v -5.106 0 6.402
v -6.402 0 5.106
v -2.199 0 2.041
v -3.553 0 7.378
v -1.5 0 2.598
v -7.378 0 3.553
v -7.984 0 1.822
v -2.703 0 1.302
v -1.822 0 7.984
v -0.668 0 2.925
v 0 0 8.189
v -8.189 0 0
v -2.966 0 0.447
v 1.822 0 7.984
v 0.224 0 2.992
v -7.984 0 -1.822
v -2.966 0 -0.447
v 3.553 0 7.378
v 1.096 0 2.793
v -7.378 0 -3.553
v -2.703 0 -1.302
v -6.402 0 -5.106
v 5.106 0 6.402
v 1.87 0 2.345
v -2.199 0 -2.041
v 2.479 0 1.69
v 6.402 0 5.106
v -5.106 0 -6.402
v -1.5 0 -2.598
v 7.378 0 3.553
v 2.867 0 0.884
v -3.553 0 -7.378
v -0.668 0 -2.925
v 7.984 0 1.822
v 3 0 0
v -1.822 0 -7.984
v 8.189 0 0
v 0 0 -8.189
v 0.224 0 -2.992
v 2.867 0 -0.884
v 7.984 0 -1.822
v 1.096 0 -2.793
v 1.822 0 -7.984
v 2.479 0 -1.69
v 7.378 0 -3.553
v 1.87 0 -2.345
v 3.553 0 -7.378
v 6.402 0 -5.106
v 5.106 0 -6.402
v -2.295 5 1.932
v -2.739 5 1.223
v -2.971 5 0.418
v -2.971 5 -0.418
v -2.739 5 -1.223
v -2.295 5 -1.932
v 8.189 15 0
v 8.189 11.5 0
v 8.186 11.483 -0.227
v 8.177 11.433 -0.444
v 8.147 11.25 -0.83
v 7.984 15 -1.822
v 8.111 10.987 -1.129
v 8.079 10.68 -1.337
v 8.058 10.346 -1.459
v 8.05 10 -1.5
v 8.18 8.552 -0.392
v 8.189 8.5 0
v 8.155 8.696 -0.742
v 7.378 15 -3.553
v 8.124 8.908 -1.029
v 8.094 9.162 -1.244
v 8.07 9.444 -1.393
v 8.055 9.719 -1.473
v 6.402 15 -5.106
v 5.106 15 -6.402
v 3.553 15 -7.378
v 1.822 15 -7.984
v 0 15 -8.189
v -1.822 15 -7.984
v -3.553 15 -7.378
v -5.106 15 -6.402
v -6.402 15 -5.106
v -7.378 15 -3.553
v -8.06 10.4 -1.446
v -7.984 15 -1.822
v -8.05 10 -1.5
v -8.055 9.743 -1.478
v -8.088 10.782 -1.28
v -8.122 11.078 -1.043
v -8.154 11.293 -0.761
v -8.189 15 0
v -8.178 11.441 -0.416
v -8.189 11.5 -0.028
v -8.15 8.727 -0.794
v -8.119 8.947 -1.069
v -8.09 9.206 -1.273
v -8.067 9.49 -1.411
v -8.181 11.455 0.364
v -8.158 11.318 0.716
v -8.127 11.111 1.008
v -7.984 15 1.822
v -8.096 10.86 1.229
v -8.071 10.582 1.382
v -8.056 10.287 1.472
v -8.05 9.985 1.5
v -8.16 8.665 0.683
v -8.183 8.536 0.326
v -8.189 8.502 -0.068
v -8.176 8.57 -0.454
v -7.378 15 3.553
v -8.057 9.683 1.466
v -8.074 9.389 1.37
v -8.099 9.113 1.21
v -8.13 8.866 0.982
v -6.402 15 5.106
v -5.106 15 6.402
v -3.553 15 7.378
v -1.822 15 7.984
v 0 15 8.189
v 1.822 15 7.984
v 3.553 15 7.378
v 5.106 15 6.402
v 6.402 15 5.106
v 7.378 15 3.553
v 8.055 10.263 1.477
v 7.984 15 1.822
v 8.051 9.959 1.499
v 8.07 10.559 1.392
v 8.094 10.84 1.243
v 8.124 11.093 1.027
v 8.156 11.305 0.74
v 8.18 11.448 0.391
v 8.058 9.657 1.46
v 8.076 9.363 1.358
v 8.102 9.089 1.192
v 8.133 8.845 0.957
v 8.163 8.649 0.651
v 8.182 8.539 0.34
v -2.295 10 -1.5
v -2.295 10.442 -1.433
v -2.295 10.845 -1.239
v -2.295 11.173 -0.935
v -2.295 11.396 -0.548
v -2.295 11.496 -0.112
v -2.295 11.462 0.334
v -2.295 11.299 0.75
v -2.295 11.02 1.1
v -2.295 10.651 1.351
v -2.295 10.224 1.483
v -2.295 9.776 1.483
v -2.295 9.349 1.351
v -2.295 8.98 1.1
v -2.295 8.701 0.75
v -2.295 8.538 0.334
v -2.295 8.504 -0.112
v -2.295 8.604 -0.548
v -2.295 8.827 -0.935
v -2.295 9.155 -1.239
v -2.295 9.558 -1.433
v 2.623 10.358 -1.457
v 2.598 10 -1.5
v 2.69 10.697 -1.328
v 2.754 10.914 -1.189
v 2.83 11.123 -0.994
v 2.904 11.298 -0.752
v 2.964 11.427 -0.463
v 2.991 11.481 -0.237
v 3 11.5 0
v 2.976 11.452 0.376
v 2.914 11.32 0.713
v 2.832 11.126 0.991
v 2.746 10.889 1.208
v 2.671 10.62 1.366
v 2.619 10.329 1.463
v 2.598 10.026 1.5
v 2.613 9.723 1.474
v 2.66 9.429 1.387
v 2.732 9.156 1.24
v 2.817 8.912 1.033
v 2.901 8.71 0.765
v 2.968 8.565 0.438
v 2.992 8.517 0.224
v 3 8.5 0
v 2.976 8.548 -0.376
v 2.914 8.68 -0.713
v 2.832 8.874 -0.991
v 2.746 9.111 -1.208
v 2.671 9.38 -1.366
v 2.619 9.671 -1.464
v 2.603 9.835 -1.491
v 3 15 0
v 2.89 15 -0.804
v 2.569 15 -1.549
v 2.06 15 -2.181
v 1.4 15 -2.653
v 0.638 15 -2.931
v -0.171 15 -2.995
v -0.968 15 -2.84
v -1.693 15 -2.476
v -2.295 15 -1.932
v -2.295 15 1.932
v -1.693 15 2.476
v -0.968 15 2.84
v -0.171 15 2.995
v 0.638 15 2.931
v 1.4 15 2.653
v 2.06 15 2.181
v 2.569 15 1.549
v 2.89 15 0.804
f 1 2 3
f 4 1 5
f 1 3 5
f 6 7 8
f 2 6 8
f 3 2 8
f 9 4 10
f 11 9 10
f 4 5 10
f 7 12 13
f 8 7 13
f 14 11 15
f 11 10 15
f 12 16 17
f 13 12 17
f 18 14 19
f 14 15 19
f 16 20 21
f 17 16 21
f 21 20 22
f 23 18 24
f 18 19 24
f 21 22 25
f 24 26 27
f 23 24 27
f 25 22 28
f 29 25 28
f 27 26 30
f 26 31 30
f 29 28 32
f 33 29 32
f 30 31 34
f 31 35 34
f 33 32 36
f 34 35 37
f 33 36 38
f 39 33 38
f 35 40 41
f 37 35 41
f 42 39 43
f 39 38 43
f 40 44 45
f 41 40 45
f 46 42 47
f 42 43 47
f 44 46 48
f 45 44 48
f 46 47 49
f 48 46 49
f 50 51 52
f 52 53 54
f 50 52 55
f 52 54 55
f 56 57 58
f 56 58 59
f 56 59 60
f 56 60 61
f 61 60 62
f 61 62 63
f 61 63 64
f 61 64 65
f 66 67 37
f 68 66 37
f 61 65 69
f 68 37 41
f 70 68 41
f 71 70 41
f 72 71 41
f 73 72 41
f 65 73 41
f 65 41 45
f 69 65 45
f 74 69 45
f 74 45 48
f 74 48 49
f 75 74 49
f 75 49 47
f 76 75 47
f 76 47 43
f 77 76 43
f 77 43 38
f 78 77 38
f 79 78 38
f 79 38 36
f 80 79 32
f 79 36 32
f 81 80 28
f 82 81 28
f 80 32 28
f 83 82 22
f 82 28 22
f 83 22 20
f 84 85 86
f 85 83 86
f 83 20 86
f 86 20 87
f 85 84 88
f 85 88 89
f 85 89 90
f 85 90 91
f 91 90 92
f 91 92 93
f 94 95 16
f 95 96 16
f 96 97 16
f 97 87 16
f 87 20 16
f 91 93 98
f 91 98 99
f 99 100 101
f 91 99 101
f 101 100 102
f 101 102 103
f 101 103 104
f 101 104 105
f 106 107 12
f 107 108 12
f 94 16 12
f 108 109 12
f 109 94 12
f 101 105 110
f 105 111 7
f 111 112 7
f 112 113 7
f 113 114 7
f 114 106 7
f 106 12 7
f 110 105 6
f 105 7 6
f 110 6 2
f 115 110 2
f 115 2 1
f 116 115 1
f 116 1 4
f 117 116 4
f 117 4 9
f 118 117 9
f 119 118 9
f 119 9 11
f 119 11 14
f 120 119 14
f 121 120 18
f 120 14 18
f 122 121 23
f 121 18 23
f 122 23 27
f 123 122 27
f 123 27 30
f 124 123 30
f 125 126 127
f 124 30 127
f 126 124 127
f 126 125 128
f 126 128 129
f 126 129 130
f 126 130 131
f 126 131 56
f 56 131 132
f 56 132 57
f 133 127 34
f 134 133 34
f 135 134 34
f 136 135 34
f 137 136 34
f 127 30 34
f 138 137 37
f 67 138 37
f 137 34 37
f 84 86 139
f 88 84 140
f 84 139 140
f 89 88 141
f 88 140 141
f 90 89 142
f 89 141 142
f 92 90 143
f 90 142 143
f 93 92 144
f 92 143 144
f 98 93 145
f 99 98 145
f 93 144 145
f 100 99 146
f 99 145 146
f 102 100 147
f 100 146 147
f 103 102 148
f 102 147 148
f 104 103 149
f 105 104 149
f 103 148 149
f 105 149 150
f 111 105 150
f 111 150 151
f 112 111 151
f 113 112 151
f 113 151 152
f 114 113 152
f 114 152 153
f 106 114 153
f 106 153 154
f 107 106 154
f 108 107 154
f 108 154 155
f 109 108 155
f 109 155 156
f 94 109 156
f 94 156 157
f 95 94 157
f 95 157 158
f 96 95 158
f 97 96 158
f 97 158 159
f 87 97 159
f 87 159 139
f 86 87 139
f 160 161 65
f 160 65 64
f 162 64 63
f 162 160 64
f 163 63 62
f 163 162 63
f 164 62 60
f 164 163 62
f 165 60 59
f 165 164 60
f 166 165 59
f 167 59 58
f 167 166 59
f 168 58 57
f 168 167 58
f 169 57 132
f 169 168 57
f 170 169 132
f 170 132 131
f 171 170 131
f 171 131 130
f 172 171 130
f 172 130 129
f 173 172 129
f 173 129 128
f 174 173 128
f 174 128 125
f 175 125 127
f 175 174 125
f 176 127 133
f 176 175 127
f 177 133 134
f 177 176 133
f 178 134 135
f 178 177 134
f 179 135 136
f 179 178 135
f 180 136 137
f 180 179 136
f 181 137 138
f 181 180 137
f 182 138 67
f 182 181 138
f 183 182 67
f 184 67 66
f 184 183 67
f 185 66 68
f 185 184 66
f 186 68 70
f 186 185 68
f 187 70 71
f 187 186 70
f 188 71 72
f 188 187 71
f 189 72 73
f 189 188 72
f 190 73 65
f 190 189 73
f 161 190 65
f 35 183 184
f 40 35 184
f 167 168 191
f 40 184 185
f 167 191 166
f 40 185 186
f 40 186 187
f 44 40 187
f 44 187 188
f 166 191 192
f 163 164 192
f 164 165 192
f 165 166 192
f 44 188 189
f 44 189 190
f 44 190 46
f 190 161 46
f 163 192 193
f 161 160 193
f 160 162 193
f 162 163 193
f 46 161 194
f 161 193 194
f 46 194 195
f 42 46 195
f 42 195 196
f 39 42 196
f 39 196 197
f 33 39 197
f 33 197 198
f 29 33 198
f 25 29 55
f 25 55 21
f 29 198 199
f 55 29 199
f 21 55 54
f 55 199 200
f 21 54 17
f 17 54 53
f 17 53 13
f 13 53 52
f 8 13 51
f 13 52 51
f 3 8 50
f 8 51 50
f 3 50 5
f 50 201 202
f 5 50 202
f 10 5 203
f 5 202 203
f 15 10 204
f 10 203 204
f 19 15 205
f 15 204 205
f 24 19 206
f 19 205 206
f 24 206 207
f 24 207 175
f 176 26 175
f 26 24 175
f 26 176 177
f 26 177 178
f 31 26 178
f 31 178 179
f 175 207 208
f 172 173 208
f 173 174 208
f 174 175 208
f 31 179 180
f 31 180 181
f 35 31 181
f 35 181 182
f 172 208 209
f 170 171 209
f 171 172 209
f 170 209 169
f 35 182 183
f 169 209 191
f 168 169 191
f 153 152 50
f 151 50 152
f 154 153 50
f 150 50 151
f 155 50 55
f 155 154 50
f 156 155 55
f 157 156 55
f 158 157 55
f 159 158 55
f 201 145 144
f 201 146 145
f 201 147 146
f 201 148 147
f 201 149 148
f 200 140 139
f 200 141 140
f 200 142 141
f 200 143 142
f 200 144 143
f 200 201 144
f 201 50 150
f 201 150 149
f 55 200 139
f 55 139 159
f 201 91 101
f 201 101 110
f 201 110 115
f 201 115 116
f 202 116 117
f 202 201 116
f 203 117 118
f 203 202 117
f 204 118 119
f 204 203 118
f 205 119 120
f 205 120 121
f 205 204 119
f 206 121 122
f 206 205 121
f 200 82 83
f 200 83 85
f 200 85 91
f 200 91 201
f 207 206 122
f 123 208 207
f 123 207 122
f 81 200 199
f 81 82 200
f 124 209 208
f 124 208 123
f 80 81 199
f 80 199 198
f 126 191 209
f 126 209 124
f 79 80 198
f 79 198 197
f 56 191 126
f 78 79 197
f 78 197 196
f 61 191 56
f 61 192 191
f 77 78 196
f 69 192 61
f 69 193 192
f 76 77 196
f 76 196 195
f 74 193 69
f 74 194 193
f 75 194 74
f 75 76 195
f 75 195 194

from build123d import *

# Parameters (mm, degrees)
SKETCH1_R               = 8.189006913
BOSS_EXTRUDE1_DEPTH     = 15
SKETCH2_R               = 3
CUT_EXTRUDE1_DEPTH      = 30
SKETCH4_W               = 1.839212521
SKETCH4_H               = 4.190652527
BOSS_EXTRUDE2_DEPTH     = 10
CUT_EXTRUDE2_DEPTH      = 10
CUT_EXTRUDE2_DEPTH_BACK = 10
SKETCH3_R               = 1.5


with BuildPart() as part:
    # Sketch1 → Boss-Extrude1 (new body)
    with BuildSketch(Plane(origin=(0, 0, 0), x_dir=(1, 0, 0), z_dir=(0, 1, 0))):
        Circle(SKETCH1_R)
    extrude(amount=BOSS_EXTRUDE1_DEPTH)

    # Sketch2 → Cut-Extrude1 (cut)
    with BuildSketch(Plane(origin=(0, 15, 0), x_dir=(1, 0, 0), z_dir=(0, 1, 0))):
        Circle(SKETCH2_R)
    extrude(amount=-CUT_EXTRUDE1_DEPTH, mode=Mode.SUBTRACT)

    # Sketch4 → Boss-Extrude2 (add)
    with BuildSketch(Plane(origin=(0, 15, 0), x_dir=(1, 0, 0), z_dir=(0, 1, 0))):
        with Locations((-3.214713917, 0.163363311)):
            Rectangle(SKETCH4_W, SKETCH4_H)
    extrude(amount=-BOSS_EXTRUDE2_DEPTH)

    # Sketch3 → Cut-Extrude2 (cut, two sides: drawn at the far end of the back side and taken through both)
    with BuildSketch(Plane(origin=(0, 0, 0), x_dir=(0, 0, -1), z_dir=(1, 0, 0)).offset(-CUT_EXTRUDE2_DEPTH_BACK)):
        with Locations((0, 10)):
            Circle(SKETCH3_R)
    extrude(amount=CUT_EXTRUDE2_DEPTH + CUT_EXTRUDE2_DEPTH_BACK, mode=Mode.SUBTRACT)


solid = part.part
